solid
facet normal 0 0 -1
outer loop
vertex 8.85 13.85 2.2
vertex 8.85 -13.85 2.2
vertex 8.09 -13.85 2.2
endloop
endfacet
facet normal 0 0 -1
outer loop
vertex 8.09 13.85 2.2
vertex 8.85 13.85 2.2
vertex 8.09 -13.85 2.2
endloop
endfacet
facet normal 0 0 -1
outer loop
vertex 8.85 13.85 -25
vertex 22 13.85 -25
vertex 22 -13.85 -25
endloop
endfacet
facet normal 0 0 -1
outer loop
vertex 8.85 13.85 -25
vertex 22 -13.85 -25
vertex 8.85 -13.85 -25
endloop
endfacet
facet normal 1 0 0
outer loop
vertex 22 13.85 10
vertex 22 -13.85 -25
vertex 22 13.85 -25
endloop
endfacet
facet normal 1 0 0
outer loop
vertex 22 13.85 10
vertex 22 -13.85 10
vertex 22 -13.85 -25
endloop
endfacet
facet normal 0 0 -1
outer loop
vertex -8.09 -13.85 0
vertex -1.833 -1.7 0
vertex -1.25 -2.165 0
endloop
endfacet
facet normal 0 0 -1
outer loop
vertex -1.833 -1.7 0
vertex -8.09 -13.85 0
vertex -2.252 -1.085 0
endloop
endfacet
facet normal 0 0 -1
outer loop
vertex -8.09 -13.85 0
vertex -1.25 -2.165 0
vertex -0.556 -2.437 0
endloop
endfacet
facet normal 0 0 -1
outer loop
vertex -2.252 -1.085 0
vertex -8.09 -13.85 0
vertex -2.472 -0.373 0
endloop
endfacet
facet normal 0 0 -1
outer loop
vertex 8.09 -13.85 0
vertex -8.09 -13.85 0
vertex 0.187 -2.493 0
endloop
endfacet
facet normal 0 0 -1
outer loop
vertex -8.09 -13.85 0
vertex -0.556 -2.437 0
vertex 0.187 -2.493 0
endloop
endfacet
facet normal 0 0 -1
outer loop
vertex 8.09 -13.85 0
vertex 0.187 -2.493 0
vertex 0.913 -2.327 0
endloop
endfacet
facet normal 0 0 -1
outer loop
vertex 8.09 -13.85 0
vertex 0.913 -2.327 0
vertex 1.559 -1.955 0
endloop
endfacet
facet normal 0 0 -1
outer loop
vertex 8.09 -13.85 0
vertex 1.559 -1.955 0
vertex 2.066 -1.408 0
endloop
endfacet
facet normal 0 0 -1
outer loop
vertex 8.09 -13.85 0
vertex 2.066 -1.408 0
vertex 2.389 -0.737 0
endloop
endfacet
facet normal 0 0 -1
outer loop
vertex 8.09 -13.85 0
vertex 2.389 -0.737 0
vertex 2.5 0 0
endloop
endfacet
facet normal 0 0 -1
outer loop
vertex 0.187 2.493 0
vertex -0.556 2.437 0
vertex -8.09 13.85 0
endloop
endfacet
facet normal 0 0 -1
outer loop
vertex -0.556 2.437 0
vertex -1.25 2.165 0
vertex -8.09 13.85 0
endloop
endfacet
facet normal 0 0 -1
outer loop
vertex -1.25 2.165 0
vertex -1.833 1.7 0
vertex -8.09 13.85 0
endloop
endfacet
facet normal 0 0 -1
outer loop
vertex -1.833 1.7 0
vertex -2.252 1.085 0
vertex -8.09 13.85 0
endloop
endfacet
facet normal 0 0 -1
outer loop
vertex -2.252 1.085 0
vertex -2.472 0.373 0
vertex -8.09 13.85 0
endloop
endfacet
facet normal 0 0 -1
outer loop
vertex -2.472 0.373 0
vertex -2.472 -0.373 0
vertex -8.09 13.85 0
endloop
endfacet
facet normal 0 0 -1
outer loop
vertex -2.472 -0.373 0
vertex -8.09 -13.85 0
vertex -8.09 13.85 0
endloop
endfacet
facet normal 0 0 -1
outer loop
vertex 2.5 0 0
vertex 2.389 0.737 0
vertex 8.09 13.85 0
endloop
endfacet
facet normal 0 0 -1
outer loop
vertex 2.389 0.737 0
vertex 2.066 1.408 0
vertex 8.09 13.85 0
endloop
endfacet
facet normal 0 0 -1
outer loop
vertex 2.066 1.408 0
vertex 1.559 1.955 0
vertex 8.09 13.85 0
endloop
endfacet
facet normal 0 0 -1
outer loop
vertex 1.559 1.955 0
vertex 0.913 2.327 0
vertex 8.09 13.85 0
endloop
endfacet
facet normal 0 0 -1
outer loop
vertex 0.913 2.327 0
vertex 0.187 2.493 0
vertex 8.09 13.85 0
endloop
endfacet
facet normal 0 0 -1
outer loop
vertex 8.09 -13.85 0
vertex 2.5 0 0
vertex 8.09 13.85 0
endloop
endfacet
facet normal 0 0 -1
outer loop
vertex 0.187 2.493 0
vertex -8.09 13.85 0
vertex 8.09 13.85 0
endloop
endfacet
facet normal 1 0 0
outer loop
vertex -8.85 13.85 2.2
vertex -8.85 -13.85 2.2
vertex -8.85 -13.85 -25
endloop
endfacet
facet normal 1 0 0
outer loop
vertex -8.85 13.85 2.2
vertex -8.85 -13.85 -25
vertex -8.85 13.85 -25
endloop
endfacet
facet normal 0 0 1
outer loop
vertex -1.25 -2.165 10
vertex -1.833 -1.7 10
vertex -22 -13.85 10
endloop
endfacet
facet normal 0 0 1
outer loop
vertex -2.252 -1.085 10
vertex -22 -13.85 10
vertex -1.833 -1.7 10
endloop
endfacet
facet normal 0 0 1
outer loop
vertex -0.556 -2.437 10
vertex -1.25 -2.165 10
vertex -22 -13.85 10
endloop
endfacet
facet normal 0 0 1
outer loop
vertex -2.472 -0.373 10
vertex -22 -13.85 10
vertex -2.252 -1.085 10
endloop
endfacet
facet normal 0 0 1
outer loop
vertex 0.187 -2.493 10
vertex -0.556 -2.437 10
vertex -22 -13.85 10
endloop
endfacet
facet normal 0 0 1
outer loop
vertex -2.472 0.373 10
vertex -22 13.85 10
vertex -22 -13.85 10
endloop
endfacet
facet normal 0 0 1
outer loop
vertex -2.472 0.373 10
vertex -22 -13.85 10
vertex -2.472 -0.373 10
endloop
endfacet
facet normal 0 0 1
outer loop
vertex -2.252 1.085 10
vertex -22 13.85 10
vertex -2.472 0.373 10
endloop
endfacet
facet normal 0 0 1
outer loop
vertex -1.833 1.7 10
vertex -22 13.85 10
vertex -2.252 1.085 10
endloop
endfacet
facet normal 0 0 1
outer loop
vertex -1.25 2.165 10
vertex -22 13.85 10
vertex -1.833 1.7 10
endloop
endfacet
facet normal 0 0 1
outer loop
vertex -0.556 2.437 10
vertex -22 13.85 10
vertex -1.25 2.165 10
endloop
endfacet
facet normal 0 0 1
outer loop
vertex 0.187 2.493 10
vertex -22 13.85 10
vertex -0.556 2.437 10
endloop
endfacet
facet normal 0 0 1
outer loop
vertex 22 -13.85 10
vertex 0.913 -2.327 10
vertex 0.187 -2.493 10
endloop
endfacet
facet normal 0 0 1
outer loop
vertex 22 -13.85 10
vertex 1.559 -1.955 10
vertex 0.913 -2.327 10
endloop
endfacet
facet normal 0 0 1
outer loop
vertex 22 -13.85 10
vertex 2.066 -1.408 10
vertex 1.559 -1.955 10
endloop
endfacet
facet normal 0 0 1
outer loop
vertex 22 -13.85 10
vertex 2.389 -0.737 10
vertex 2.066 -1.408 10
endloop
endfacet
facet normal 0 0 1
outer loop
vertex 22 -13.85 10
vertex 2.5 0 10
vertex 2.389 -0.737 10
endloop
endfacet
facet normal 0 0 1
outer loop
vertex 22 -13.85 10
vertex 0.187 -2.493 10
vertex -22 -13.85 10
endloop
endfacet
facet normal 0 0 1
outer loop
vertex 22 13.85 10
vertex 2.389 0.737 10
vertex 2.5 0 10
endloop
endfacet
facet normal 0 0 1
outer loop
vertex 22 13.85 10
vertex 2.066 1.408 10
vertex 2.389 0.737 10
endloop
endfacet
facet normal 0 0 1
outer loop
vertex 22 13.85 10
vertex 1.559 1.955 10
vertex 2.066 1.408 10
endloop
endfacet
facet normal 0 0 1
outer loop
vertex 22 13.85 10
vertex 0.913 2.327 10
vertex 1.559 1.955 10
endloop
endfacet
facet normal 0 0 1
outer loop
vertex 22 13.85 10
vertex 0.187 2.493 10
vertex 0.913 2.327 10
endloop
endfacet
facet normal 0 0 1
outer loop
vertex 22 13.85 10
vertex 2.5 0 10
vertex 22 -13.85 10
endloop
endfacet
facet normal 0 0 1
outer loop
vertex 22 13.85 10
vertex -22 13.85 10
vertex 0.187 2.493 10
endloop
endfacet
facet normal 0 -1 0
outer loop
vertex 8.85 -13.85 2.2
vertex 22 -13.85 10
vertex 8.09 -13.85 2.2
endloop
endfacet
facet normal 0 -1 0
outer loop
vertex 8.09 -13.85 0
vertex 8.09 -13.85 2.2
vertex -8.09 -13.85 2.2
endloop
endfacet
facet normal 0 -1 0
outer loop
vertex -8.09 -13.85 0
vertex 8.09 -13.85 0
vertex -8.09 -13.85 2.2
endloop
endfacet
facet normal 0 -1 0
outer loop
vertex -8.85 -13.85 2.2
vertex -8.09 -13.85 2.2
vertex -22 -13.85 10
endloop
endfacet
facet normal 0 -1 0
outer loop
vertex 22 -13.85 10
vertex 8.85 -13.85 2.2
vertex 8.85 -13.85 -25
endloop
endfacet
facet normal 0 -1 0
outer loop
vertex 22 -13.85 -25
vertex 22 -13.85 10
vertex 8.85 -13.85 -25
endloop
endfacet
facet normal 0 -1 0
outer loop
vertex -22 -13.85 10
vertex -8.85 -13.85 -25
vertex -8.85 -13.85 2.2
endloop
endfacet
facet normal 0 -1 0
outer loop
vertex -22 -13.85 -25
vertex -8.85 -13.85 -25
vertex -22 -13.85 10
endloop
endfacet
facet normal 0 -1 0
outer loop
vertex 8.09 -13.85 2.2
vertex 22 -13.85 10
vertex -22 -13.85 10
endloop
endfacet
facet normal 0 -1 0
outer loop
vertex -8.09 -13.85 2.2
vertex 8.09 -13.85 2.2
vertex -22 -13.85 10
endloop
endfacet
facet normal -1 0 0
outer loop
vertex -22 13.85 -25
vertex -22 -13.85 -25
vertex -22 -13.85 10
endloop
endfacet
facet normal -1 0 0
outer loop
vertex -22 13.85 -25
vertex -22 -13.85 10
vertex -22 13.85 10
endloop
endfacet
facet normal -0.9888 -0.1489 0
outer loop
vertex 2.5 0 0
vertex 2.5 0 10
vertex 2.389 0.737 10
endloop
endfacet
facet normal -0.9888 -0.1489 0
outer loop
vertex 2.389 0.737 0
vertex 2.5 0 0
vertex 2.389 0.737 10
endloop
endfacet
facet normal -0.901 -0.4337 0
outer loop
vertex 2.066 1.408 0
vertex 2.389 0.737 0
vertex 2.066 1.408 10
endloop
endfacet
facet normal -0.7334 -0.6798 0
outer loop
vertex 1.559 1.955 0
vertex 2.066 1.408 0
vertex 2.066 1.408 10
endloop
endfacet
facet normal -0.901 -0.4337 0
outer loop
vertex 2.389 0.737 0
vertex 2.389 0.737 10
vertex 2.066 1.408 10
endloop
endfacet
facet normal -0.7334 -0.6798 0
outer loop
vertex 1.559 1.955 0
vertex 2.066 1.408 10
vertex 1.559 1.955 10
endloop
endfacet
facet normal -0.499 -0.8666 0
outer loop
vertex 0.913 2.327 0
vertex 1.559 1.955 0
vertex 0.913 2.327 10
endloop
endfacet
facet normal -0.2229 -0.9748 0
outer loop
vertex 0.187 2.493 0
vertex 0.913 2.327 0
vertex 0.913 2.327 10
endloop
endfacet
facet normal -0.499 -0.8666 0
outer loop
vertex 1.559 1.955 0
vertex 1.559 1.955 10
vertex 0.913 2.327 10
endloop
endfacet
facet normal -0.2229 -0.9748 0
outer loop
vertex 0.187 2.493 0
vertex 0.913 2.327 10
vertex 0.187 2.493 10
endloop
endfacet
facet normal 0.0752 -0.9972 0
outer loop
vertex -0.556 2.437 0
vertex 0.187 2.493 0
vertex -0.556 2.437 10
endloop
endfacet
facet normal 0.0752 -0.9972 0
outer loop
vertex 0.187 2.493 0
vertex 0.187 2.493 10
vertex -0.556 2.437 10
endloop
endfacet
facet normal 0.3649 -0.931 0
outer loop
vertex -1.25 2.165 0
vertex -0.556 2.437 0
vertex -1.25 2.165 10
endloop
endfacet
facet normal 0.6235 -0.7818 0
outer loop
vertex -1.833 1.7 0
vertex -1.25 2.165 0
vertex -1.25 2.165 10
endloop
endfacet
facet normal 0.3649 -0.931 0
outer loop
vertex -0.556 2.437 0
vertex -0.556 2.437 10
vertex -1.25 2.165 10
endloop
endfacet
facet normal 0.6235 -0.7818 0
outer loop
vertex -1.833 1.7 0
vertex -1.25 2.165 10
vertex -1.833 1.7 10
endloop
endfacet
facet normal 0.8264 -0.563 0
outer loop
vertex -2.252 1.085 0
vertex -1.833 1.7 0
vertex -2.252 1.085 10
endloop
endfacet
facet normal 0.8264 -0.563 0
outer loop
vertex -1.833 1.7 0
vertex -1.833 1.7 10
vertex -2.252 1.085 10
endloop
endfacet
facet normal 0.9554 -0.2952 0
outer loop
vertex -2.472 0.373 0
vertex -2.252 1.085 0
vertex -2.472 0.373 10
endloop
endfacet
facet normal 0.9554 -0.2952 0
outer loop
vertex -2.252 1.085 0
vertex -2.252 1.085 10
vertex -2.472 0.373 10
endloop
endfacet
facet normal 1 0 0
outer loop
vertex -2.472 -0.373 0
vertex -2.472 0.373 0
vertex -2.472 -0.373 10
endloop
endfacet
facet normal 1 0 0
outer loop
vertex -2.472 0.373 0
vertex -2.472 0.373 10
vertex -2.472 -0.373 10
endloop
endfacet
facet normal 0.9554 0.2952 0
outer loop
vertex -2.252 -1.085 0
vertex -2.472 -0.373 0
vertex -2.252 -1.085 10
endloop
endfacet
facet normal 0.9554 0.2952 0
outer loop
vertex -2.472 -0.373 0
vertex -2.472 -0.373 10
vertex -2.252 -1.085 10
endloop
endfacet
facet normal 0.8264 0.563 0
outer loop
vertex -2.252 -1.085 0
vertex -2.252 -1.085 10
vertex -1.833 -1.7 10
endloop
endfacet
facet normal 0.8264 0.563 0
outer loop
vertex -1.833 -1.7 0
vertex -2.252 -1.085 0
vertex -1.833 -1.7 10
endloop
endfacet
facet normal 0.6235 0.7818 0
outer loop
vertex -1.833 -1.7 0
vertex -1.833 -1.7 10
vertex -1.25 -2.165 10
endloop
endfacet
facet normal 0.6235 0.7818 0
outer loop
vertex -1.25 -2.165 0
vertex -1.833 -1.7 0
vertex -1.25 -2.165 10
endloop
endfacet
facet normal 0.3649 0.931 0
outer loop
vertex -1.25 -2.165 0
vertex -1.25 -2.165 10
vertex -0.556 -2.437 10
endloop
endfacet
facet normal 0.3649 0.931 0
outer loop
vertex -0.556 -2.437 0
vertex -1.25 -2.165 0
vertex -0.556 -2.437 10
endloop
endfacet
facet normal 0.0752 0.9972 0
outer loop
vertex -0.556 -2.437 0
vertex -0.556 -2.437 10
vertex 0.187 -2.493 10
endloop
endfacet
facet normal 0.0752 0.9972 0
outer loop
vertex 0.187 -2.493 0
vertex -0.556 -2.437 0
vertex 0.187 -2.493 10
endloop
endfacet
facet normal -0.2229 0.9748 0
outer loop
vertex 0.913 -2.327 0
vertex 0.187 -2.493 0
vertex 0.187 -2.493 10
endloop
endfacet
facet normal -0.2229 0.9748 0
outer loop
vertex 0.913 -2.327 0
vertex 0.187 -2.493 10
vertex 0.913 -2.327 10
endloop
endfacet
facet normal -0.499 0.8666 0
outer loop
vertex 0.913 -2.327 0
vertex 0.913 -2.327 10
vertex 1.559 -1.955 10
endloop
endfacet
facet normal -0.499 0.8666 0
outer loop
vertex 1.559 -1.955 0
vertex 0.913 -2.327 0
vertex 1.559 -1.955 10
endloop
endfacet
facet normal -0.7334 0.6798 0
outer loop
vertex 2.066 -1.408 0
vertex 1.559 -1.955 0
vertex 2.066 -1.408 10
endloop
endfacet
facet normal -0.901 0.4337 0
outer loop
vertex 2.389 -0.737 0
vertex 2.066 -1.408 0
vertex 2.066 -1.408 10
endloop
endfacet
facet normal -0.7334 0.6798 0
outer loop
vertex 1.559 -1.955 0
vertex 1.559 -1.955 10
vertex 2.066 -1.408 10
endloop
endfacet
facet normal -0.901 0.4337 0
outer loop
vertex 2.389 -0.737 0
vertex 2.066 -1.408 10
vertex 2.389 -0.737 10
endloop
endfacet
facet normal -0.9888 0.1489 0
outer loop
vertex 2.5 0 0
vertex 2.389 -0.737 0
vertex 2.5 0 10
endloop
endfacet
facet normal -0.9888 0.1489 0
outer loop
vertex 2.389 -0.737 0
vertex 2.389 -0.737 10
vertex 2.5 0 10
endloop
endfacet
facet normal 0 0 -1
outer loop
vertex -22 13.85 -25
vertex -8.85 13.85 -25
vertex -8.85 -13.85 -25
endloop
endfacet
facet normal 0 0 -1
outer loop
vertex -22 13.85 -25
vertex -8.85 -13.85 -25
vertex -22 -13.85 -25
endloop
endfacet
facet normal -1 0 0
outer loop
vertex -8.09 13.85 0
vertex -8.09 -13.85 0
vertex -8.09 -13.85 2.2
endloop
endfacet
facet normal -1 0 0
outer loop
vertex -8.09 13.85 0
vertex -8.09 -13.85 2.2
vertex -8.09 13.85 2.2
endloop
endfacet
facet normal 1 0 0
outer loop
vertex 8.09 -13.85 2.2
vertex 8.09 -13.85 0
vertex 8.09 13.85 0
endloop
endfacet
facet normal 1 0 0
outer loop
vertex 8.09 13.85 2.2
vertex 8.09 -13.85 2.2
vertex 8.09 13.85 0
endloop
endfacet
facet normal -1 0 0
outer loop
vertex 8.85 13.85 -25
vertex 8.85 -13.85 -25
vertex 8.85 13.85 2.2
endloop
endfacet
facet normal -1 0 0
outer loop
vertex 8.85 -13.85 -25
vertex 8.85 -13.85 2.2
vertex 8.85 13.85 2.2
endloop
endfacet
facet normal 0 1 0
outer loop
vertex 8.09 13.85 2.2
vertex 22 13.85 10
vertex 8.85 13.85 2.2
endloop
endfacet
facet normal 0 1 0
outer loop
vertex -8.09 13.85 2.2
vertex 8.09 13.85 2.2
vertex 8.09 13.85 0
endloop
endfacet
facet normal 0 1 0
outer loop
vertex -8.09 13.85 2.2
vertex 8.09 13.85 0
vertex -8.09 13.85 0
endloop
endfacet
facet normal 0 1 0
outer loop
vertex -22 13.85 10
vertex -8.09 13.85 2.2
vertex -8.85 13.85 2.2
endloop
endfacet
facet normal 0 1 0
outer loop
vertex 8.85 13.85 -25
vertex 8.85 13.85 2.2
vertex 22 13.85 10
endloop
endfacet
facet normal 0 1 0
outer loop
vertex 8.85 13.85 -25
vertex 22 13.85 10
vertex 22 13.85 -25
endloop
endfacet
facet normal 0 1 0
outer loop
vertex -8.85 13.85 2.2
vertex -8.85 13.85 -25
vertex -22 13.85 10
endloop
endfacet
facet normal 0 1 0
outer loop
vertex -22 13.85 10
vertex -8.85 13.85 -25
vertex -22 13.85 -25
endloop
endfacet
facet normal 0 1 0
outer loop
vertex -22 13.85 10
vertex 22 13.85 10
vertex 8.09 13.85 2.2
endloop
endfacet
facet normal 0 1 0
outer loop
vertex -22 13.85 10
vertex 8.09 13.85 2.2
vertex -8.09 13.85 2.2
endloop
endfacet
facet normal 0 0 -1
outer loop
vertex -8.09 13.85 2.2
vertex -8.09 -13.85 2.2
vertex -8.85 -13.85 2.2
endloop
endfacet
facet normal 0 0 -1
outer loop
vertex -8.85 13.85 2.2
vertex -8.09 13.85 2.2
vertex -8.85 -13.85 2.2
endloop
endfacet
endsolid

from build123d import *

# Parameters (mm, degrees)
SKETCH1_W           = 44
SKETCH1_H           = 27.7
BOSS_EXTRUDE1_DEPTH = 10
SKETCH2_W           = 13.15
SKETCH2_H           = 27.7
BOSS_EXTRUDE2_DEPTH = 25
SKETCH3_R           = 2.5
CUT_EXTRUDE1_DEPTH  = 10
SKETCH4_W           = 0.76
SKETCH4_H           = 27.7
CUT_EXTRUDE2_DEPTH  = 2.2


with BuildPart() as part:
    # Sketch1 → Boss-Extrude1 (new body)
    with BuildSketch(Plane.XY):
        Rectangle(SKETCH1_W, SKETCH1_H)
    extrude(amount=BOSS_EXTRUDE1_DEPTH)

    # Sketch2 → Boss-Extrude2 (add)
    with BuildSketch(Plane(origin=(0, 0, 0), x_dir=(-1, 0, 0), z_dir=(0, 0, -1))):
        with Locations((-15.425, 0)):
            Rectangle(SKETCH2_W, SKETCH2_H)
        with Locations((15.425, 0)):
            Rectangle(SKETCH2_W, SKETCH2_H)
    extrude(amount=BOSS_EXTRUDE2_DEPTH)

    # Sketch3 → Cut-Extrude1 (cut)
    with BuildSketch(Plane.XY.offset(10)):
        Circle(SKETCH3_R)
    extrude(amount=-CUT_EXTRUDE1_DEPTH, mode=Mode.SUBTRACT)

    # Sketch4 → Cut-Extrude2 (cut)
    with BuildSketch(Plane(origin=(0, 0, 0), x_dir=(-1, 0, 0), z_dir=(0, 0, -1))):
        with Locations((-8.47, 0)):
            Rectangle(SKETCH4_W, SKETCH4_H)
        with Locations((8.47, 0)):
            Rectangle(SKETCH4_W, SKETCH4_H)
    extrude(amount=-CUT_EXTRUDE2_DEPTH, mode=Mode.SUBTRACT)


solid = part.part
